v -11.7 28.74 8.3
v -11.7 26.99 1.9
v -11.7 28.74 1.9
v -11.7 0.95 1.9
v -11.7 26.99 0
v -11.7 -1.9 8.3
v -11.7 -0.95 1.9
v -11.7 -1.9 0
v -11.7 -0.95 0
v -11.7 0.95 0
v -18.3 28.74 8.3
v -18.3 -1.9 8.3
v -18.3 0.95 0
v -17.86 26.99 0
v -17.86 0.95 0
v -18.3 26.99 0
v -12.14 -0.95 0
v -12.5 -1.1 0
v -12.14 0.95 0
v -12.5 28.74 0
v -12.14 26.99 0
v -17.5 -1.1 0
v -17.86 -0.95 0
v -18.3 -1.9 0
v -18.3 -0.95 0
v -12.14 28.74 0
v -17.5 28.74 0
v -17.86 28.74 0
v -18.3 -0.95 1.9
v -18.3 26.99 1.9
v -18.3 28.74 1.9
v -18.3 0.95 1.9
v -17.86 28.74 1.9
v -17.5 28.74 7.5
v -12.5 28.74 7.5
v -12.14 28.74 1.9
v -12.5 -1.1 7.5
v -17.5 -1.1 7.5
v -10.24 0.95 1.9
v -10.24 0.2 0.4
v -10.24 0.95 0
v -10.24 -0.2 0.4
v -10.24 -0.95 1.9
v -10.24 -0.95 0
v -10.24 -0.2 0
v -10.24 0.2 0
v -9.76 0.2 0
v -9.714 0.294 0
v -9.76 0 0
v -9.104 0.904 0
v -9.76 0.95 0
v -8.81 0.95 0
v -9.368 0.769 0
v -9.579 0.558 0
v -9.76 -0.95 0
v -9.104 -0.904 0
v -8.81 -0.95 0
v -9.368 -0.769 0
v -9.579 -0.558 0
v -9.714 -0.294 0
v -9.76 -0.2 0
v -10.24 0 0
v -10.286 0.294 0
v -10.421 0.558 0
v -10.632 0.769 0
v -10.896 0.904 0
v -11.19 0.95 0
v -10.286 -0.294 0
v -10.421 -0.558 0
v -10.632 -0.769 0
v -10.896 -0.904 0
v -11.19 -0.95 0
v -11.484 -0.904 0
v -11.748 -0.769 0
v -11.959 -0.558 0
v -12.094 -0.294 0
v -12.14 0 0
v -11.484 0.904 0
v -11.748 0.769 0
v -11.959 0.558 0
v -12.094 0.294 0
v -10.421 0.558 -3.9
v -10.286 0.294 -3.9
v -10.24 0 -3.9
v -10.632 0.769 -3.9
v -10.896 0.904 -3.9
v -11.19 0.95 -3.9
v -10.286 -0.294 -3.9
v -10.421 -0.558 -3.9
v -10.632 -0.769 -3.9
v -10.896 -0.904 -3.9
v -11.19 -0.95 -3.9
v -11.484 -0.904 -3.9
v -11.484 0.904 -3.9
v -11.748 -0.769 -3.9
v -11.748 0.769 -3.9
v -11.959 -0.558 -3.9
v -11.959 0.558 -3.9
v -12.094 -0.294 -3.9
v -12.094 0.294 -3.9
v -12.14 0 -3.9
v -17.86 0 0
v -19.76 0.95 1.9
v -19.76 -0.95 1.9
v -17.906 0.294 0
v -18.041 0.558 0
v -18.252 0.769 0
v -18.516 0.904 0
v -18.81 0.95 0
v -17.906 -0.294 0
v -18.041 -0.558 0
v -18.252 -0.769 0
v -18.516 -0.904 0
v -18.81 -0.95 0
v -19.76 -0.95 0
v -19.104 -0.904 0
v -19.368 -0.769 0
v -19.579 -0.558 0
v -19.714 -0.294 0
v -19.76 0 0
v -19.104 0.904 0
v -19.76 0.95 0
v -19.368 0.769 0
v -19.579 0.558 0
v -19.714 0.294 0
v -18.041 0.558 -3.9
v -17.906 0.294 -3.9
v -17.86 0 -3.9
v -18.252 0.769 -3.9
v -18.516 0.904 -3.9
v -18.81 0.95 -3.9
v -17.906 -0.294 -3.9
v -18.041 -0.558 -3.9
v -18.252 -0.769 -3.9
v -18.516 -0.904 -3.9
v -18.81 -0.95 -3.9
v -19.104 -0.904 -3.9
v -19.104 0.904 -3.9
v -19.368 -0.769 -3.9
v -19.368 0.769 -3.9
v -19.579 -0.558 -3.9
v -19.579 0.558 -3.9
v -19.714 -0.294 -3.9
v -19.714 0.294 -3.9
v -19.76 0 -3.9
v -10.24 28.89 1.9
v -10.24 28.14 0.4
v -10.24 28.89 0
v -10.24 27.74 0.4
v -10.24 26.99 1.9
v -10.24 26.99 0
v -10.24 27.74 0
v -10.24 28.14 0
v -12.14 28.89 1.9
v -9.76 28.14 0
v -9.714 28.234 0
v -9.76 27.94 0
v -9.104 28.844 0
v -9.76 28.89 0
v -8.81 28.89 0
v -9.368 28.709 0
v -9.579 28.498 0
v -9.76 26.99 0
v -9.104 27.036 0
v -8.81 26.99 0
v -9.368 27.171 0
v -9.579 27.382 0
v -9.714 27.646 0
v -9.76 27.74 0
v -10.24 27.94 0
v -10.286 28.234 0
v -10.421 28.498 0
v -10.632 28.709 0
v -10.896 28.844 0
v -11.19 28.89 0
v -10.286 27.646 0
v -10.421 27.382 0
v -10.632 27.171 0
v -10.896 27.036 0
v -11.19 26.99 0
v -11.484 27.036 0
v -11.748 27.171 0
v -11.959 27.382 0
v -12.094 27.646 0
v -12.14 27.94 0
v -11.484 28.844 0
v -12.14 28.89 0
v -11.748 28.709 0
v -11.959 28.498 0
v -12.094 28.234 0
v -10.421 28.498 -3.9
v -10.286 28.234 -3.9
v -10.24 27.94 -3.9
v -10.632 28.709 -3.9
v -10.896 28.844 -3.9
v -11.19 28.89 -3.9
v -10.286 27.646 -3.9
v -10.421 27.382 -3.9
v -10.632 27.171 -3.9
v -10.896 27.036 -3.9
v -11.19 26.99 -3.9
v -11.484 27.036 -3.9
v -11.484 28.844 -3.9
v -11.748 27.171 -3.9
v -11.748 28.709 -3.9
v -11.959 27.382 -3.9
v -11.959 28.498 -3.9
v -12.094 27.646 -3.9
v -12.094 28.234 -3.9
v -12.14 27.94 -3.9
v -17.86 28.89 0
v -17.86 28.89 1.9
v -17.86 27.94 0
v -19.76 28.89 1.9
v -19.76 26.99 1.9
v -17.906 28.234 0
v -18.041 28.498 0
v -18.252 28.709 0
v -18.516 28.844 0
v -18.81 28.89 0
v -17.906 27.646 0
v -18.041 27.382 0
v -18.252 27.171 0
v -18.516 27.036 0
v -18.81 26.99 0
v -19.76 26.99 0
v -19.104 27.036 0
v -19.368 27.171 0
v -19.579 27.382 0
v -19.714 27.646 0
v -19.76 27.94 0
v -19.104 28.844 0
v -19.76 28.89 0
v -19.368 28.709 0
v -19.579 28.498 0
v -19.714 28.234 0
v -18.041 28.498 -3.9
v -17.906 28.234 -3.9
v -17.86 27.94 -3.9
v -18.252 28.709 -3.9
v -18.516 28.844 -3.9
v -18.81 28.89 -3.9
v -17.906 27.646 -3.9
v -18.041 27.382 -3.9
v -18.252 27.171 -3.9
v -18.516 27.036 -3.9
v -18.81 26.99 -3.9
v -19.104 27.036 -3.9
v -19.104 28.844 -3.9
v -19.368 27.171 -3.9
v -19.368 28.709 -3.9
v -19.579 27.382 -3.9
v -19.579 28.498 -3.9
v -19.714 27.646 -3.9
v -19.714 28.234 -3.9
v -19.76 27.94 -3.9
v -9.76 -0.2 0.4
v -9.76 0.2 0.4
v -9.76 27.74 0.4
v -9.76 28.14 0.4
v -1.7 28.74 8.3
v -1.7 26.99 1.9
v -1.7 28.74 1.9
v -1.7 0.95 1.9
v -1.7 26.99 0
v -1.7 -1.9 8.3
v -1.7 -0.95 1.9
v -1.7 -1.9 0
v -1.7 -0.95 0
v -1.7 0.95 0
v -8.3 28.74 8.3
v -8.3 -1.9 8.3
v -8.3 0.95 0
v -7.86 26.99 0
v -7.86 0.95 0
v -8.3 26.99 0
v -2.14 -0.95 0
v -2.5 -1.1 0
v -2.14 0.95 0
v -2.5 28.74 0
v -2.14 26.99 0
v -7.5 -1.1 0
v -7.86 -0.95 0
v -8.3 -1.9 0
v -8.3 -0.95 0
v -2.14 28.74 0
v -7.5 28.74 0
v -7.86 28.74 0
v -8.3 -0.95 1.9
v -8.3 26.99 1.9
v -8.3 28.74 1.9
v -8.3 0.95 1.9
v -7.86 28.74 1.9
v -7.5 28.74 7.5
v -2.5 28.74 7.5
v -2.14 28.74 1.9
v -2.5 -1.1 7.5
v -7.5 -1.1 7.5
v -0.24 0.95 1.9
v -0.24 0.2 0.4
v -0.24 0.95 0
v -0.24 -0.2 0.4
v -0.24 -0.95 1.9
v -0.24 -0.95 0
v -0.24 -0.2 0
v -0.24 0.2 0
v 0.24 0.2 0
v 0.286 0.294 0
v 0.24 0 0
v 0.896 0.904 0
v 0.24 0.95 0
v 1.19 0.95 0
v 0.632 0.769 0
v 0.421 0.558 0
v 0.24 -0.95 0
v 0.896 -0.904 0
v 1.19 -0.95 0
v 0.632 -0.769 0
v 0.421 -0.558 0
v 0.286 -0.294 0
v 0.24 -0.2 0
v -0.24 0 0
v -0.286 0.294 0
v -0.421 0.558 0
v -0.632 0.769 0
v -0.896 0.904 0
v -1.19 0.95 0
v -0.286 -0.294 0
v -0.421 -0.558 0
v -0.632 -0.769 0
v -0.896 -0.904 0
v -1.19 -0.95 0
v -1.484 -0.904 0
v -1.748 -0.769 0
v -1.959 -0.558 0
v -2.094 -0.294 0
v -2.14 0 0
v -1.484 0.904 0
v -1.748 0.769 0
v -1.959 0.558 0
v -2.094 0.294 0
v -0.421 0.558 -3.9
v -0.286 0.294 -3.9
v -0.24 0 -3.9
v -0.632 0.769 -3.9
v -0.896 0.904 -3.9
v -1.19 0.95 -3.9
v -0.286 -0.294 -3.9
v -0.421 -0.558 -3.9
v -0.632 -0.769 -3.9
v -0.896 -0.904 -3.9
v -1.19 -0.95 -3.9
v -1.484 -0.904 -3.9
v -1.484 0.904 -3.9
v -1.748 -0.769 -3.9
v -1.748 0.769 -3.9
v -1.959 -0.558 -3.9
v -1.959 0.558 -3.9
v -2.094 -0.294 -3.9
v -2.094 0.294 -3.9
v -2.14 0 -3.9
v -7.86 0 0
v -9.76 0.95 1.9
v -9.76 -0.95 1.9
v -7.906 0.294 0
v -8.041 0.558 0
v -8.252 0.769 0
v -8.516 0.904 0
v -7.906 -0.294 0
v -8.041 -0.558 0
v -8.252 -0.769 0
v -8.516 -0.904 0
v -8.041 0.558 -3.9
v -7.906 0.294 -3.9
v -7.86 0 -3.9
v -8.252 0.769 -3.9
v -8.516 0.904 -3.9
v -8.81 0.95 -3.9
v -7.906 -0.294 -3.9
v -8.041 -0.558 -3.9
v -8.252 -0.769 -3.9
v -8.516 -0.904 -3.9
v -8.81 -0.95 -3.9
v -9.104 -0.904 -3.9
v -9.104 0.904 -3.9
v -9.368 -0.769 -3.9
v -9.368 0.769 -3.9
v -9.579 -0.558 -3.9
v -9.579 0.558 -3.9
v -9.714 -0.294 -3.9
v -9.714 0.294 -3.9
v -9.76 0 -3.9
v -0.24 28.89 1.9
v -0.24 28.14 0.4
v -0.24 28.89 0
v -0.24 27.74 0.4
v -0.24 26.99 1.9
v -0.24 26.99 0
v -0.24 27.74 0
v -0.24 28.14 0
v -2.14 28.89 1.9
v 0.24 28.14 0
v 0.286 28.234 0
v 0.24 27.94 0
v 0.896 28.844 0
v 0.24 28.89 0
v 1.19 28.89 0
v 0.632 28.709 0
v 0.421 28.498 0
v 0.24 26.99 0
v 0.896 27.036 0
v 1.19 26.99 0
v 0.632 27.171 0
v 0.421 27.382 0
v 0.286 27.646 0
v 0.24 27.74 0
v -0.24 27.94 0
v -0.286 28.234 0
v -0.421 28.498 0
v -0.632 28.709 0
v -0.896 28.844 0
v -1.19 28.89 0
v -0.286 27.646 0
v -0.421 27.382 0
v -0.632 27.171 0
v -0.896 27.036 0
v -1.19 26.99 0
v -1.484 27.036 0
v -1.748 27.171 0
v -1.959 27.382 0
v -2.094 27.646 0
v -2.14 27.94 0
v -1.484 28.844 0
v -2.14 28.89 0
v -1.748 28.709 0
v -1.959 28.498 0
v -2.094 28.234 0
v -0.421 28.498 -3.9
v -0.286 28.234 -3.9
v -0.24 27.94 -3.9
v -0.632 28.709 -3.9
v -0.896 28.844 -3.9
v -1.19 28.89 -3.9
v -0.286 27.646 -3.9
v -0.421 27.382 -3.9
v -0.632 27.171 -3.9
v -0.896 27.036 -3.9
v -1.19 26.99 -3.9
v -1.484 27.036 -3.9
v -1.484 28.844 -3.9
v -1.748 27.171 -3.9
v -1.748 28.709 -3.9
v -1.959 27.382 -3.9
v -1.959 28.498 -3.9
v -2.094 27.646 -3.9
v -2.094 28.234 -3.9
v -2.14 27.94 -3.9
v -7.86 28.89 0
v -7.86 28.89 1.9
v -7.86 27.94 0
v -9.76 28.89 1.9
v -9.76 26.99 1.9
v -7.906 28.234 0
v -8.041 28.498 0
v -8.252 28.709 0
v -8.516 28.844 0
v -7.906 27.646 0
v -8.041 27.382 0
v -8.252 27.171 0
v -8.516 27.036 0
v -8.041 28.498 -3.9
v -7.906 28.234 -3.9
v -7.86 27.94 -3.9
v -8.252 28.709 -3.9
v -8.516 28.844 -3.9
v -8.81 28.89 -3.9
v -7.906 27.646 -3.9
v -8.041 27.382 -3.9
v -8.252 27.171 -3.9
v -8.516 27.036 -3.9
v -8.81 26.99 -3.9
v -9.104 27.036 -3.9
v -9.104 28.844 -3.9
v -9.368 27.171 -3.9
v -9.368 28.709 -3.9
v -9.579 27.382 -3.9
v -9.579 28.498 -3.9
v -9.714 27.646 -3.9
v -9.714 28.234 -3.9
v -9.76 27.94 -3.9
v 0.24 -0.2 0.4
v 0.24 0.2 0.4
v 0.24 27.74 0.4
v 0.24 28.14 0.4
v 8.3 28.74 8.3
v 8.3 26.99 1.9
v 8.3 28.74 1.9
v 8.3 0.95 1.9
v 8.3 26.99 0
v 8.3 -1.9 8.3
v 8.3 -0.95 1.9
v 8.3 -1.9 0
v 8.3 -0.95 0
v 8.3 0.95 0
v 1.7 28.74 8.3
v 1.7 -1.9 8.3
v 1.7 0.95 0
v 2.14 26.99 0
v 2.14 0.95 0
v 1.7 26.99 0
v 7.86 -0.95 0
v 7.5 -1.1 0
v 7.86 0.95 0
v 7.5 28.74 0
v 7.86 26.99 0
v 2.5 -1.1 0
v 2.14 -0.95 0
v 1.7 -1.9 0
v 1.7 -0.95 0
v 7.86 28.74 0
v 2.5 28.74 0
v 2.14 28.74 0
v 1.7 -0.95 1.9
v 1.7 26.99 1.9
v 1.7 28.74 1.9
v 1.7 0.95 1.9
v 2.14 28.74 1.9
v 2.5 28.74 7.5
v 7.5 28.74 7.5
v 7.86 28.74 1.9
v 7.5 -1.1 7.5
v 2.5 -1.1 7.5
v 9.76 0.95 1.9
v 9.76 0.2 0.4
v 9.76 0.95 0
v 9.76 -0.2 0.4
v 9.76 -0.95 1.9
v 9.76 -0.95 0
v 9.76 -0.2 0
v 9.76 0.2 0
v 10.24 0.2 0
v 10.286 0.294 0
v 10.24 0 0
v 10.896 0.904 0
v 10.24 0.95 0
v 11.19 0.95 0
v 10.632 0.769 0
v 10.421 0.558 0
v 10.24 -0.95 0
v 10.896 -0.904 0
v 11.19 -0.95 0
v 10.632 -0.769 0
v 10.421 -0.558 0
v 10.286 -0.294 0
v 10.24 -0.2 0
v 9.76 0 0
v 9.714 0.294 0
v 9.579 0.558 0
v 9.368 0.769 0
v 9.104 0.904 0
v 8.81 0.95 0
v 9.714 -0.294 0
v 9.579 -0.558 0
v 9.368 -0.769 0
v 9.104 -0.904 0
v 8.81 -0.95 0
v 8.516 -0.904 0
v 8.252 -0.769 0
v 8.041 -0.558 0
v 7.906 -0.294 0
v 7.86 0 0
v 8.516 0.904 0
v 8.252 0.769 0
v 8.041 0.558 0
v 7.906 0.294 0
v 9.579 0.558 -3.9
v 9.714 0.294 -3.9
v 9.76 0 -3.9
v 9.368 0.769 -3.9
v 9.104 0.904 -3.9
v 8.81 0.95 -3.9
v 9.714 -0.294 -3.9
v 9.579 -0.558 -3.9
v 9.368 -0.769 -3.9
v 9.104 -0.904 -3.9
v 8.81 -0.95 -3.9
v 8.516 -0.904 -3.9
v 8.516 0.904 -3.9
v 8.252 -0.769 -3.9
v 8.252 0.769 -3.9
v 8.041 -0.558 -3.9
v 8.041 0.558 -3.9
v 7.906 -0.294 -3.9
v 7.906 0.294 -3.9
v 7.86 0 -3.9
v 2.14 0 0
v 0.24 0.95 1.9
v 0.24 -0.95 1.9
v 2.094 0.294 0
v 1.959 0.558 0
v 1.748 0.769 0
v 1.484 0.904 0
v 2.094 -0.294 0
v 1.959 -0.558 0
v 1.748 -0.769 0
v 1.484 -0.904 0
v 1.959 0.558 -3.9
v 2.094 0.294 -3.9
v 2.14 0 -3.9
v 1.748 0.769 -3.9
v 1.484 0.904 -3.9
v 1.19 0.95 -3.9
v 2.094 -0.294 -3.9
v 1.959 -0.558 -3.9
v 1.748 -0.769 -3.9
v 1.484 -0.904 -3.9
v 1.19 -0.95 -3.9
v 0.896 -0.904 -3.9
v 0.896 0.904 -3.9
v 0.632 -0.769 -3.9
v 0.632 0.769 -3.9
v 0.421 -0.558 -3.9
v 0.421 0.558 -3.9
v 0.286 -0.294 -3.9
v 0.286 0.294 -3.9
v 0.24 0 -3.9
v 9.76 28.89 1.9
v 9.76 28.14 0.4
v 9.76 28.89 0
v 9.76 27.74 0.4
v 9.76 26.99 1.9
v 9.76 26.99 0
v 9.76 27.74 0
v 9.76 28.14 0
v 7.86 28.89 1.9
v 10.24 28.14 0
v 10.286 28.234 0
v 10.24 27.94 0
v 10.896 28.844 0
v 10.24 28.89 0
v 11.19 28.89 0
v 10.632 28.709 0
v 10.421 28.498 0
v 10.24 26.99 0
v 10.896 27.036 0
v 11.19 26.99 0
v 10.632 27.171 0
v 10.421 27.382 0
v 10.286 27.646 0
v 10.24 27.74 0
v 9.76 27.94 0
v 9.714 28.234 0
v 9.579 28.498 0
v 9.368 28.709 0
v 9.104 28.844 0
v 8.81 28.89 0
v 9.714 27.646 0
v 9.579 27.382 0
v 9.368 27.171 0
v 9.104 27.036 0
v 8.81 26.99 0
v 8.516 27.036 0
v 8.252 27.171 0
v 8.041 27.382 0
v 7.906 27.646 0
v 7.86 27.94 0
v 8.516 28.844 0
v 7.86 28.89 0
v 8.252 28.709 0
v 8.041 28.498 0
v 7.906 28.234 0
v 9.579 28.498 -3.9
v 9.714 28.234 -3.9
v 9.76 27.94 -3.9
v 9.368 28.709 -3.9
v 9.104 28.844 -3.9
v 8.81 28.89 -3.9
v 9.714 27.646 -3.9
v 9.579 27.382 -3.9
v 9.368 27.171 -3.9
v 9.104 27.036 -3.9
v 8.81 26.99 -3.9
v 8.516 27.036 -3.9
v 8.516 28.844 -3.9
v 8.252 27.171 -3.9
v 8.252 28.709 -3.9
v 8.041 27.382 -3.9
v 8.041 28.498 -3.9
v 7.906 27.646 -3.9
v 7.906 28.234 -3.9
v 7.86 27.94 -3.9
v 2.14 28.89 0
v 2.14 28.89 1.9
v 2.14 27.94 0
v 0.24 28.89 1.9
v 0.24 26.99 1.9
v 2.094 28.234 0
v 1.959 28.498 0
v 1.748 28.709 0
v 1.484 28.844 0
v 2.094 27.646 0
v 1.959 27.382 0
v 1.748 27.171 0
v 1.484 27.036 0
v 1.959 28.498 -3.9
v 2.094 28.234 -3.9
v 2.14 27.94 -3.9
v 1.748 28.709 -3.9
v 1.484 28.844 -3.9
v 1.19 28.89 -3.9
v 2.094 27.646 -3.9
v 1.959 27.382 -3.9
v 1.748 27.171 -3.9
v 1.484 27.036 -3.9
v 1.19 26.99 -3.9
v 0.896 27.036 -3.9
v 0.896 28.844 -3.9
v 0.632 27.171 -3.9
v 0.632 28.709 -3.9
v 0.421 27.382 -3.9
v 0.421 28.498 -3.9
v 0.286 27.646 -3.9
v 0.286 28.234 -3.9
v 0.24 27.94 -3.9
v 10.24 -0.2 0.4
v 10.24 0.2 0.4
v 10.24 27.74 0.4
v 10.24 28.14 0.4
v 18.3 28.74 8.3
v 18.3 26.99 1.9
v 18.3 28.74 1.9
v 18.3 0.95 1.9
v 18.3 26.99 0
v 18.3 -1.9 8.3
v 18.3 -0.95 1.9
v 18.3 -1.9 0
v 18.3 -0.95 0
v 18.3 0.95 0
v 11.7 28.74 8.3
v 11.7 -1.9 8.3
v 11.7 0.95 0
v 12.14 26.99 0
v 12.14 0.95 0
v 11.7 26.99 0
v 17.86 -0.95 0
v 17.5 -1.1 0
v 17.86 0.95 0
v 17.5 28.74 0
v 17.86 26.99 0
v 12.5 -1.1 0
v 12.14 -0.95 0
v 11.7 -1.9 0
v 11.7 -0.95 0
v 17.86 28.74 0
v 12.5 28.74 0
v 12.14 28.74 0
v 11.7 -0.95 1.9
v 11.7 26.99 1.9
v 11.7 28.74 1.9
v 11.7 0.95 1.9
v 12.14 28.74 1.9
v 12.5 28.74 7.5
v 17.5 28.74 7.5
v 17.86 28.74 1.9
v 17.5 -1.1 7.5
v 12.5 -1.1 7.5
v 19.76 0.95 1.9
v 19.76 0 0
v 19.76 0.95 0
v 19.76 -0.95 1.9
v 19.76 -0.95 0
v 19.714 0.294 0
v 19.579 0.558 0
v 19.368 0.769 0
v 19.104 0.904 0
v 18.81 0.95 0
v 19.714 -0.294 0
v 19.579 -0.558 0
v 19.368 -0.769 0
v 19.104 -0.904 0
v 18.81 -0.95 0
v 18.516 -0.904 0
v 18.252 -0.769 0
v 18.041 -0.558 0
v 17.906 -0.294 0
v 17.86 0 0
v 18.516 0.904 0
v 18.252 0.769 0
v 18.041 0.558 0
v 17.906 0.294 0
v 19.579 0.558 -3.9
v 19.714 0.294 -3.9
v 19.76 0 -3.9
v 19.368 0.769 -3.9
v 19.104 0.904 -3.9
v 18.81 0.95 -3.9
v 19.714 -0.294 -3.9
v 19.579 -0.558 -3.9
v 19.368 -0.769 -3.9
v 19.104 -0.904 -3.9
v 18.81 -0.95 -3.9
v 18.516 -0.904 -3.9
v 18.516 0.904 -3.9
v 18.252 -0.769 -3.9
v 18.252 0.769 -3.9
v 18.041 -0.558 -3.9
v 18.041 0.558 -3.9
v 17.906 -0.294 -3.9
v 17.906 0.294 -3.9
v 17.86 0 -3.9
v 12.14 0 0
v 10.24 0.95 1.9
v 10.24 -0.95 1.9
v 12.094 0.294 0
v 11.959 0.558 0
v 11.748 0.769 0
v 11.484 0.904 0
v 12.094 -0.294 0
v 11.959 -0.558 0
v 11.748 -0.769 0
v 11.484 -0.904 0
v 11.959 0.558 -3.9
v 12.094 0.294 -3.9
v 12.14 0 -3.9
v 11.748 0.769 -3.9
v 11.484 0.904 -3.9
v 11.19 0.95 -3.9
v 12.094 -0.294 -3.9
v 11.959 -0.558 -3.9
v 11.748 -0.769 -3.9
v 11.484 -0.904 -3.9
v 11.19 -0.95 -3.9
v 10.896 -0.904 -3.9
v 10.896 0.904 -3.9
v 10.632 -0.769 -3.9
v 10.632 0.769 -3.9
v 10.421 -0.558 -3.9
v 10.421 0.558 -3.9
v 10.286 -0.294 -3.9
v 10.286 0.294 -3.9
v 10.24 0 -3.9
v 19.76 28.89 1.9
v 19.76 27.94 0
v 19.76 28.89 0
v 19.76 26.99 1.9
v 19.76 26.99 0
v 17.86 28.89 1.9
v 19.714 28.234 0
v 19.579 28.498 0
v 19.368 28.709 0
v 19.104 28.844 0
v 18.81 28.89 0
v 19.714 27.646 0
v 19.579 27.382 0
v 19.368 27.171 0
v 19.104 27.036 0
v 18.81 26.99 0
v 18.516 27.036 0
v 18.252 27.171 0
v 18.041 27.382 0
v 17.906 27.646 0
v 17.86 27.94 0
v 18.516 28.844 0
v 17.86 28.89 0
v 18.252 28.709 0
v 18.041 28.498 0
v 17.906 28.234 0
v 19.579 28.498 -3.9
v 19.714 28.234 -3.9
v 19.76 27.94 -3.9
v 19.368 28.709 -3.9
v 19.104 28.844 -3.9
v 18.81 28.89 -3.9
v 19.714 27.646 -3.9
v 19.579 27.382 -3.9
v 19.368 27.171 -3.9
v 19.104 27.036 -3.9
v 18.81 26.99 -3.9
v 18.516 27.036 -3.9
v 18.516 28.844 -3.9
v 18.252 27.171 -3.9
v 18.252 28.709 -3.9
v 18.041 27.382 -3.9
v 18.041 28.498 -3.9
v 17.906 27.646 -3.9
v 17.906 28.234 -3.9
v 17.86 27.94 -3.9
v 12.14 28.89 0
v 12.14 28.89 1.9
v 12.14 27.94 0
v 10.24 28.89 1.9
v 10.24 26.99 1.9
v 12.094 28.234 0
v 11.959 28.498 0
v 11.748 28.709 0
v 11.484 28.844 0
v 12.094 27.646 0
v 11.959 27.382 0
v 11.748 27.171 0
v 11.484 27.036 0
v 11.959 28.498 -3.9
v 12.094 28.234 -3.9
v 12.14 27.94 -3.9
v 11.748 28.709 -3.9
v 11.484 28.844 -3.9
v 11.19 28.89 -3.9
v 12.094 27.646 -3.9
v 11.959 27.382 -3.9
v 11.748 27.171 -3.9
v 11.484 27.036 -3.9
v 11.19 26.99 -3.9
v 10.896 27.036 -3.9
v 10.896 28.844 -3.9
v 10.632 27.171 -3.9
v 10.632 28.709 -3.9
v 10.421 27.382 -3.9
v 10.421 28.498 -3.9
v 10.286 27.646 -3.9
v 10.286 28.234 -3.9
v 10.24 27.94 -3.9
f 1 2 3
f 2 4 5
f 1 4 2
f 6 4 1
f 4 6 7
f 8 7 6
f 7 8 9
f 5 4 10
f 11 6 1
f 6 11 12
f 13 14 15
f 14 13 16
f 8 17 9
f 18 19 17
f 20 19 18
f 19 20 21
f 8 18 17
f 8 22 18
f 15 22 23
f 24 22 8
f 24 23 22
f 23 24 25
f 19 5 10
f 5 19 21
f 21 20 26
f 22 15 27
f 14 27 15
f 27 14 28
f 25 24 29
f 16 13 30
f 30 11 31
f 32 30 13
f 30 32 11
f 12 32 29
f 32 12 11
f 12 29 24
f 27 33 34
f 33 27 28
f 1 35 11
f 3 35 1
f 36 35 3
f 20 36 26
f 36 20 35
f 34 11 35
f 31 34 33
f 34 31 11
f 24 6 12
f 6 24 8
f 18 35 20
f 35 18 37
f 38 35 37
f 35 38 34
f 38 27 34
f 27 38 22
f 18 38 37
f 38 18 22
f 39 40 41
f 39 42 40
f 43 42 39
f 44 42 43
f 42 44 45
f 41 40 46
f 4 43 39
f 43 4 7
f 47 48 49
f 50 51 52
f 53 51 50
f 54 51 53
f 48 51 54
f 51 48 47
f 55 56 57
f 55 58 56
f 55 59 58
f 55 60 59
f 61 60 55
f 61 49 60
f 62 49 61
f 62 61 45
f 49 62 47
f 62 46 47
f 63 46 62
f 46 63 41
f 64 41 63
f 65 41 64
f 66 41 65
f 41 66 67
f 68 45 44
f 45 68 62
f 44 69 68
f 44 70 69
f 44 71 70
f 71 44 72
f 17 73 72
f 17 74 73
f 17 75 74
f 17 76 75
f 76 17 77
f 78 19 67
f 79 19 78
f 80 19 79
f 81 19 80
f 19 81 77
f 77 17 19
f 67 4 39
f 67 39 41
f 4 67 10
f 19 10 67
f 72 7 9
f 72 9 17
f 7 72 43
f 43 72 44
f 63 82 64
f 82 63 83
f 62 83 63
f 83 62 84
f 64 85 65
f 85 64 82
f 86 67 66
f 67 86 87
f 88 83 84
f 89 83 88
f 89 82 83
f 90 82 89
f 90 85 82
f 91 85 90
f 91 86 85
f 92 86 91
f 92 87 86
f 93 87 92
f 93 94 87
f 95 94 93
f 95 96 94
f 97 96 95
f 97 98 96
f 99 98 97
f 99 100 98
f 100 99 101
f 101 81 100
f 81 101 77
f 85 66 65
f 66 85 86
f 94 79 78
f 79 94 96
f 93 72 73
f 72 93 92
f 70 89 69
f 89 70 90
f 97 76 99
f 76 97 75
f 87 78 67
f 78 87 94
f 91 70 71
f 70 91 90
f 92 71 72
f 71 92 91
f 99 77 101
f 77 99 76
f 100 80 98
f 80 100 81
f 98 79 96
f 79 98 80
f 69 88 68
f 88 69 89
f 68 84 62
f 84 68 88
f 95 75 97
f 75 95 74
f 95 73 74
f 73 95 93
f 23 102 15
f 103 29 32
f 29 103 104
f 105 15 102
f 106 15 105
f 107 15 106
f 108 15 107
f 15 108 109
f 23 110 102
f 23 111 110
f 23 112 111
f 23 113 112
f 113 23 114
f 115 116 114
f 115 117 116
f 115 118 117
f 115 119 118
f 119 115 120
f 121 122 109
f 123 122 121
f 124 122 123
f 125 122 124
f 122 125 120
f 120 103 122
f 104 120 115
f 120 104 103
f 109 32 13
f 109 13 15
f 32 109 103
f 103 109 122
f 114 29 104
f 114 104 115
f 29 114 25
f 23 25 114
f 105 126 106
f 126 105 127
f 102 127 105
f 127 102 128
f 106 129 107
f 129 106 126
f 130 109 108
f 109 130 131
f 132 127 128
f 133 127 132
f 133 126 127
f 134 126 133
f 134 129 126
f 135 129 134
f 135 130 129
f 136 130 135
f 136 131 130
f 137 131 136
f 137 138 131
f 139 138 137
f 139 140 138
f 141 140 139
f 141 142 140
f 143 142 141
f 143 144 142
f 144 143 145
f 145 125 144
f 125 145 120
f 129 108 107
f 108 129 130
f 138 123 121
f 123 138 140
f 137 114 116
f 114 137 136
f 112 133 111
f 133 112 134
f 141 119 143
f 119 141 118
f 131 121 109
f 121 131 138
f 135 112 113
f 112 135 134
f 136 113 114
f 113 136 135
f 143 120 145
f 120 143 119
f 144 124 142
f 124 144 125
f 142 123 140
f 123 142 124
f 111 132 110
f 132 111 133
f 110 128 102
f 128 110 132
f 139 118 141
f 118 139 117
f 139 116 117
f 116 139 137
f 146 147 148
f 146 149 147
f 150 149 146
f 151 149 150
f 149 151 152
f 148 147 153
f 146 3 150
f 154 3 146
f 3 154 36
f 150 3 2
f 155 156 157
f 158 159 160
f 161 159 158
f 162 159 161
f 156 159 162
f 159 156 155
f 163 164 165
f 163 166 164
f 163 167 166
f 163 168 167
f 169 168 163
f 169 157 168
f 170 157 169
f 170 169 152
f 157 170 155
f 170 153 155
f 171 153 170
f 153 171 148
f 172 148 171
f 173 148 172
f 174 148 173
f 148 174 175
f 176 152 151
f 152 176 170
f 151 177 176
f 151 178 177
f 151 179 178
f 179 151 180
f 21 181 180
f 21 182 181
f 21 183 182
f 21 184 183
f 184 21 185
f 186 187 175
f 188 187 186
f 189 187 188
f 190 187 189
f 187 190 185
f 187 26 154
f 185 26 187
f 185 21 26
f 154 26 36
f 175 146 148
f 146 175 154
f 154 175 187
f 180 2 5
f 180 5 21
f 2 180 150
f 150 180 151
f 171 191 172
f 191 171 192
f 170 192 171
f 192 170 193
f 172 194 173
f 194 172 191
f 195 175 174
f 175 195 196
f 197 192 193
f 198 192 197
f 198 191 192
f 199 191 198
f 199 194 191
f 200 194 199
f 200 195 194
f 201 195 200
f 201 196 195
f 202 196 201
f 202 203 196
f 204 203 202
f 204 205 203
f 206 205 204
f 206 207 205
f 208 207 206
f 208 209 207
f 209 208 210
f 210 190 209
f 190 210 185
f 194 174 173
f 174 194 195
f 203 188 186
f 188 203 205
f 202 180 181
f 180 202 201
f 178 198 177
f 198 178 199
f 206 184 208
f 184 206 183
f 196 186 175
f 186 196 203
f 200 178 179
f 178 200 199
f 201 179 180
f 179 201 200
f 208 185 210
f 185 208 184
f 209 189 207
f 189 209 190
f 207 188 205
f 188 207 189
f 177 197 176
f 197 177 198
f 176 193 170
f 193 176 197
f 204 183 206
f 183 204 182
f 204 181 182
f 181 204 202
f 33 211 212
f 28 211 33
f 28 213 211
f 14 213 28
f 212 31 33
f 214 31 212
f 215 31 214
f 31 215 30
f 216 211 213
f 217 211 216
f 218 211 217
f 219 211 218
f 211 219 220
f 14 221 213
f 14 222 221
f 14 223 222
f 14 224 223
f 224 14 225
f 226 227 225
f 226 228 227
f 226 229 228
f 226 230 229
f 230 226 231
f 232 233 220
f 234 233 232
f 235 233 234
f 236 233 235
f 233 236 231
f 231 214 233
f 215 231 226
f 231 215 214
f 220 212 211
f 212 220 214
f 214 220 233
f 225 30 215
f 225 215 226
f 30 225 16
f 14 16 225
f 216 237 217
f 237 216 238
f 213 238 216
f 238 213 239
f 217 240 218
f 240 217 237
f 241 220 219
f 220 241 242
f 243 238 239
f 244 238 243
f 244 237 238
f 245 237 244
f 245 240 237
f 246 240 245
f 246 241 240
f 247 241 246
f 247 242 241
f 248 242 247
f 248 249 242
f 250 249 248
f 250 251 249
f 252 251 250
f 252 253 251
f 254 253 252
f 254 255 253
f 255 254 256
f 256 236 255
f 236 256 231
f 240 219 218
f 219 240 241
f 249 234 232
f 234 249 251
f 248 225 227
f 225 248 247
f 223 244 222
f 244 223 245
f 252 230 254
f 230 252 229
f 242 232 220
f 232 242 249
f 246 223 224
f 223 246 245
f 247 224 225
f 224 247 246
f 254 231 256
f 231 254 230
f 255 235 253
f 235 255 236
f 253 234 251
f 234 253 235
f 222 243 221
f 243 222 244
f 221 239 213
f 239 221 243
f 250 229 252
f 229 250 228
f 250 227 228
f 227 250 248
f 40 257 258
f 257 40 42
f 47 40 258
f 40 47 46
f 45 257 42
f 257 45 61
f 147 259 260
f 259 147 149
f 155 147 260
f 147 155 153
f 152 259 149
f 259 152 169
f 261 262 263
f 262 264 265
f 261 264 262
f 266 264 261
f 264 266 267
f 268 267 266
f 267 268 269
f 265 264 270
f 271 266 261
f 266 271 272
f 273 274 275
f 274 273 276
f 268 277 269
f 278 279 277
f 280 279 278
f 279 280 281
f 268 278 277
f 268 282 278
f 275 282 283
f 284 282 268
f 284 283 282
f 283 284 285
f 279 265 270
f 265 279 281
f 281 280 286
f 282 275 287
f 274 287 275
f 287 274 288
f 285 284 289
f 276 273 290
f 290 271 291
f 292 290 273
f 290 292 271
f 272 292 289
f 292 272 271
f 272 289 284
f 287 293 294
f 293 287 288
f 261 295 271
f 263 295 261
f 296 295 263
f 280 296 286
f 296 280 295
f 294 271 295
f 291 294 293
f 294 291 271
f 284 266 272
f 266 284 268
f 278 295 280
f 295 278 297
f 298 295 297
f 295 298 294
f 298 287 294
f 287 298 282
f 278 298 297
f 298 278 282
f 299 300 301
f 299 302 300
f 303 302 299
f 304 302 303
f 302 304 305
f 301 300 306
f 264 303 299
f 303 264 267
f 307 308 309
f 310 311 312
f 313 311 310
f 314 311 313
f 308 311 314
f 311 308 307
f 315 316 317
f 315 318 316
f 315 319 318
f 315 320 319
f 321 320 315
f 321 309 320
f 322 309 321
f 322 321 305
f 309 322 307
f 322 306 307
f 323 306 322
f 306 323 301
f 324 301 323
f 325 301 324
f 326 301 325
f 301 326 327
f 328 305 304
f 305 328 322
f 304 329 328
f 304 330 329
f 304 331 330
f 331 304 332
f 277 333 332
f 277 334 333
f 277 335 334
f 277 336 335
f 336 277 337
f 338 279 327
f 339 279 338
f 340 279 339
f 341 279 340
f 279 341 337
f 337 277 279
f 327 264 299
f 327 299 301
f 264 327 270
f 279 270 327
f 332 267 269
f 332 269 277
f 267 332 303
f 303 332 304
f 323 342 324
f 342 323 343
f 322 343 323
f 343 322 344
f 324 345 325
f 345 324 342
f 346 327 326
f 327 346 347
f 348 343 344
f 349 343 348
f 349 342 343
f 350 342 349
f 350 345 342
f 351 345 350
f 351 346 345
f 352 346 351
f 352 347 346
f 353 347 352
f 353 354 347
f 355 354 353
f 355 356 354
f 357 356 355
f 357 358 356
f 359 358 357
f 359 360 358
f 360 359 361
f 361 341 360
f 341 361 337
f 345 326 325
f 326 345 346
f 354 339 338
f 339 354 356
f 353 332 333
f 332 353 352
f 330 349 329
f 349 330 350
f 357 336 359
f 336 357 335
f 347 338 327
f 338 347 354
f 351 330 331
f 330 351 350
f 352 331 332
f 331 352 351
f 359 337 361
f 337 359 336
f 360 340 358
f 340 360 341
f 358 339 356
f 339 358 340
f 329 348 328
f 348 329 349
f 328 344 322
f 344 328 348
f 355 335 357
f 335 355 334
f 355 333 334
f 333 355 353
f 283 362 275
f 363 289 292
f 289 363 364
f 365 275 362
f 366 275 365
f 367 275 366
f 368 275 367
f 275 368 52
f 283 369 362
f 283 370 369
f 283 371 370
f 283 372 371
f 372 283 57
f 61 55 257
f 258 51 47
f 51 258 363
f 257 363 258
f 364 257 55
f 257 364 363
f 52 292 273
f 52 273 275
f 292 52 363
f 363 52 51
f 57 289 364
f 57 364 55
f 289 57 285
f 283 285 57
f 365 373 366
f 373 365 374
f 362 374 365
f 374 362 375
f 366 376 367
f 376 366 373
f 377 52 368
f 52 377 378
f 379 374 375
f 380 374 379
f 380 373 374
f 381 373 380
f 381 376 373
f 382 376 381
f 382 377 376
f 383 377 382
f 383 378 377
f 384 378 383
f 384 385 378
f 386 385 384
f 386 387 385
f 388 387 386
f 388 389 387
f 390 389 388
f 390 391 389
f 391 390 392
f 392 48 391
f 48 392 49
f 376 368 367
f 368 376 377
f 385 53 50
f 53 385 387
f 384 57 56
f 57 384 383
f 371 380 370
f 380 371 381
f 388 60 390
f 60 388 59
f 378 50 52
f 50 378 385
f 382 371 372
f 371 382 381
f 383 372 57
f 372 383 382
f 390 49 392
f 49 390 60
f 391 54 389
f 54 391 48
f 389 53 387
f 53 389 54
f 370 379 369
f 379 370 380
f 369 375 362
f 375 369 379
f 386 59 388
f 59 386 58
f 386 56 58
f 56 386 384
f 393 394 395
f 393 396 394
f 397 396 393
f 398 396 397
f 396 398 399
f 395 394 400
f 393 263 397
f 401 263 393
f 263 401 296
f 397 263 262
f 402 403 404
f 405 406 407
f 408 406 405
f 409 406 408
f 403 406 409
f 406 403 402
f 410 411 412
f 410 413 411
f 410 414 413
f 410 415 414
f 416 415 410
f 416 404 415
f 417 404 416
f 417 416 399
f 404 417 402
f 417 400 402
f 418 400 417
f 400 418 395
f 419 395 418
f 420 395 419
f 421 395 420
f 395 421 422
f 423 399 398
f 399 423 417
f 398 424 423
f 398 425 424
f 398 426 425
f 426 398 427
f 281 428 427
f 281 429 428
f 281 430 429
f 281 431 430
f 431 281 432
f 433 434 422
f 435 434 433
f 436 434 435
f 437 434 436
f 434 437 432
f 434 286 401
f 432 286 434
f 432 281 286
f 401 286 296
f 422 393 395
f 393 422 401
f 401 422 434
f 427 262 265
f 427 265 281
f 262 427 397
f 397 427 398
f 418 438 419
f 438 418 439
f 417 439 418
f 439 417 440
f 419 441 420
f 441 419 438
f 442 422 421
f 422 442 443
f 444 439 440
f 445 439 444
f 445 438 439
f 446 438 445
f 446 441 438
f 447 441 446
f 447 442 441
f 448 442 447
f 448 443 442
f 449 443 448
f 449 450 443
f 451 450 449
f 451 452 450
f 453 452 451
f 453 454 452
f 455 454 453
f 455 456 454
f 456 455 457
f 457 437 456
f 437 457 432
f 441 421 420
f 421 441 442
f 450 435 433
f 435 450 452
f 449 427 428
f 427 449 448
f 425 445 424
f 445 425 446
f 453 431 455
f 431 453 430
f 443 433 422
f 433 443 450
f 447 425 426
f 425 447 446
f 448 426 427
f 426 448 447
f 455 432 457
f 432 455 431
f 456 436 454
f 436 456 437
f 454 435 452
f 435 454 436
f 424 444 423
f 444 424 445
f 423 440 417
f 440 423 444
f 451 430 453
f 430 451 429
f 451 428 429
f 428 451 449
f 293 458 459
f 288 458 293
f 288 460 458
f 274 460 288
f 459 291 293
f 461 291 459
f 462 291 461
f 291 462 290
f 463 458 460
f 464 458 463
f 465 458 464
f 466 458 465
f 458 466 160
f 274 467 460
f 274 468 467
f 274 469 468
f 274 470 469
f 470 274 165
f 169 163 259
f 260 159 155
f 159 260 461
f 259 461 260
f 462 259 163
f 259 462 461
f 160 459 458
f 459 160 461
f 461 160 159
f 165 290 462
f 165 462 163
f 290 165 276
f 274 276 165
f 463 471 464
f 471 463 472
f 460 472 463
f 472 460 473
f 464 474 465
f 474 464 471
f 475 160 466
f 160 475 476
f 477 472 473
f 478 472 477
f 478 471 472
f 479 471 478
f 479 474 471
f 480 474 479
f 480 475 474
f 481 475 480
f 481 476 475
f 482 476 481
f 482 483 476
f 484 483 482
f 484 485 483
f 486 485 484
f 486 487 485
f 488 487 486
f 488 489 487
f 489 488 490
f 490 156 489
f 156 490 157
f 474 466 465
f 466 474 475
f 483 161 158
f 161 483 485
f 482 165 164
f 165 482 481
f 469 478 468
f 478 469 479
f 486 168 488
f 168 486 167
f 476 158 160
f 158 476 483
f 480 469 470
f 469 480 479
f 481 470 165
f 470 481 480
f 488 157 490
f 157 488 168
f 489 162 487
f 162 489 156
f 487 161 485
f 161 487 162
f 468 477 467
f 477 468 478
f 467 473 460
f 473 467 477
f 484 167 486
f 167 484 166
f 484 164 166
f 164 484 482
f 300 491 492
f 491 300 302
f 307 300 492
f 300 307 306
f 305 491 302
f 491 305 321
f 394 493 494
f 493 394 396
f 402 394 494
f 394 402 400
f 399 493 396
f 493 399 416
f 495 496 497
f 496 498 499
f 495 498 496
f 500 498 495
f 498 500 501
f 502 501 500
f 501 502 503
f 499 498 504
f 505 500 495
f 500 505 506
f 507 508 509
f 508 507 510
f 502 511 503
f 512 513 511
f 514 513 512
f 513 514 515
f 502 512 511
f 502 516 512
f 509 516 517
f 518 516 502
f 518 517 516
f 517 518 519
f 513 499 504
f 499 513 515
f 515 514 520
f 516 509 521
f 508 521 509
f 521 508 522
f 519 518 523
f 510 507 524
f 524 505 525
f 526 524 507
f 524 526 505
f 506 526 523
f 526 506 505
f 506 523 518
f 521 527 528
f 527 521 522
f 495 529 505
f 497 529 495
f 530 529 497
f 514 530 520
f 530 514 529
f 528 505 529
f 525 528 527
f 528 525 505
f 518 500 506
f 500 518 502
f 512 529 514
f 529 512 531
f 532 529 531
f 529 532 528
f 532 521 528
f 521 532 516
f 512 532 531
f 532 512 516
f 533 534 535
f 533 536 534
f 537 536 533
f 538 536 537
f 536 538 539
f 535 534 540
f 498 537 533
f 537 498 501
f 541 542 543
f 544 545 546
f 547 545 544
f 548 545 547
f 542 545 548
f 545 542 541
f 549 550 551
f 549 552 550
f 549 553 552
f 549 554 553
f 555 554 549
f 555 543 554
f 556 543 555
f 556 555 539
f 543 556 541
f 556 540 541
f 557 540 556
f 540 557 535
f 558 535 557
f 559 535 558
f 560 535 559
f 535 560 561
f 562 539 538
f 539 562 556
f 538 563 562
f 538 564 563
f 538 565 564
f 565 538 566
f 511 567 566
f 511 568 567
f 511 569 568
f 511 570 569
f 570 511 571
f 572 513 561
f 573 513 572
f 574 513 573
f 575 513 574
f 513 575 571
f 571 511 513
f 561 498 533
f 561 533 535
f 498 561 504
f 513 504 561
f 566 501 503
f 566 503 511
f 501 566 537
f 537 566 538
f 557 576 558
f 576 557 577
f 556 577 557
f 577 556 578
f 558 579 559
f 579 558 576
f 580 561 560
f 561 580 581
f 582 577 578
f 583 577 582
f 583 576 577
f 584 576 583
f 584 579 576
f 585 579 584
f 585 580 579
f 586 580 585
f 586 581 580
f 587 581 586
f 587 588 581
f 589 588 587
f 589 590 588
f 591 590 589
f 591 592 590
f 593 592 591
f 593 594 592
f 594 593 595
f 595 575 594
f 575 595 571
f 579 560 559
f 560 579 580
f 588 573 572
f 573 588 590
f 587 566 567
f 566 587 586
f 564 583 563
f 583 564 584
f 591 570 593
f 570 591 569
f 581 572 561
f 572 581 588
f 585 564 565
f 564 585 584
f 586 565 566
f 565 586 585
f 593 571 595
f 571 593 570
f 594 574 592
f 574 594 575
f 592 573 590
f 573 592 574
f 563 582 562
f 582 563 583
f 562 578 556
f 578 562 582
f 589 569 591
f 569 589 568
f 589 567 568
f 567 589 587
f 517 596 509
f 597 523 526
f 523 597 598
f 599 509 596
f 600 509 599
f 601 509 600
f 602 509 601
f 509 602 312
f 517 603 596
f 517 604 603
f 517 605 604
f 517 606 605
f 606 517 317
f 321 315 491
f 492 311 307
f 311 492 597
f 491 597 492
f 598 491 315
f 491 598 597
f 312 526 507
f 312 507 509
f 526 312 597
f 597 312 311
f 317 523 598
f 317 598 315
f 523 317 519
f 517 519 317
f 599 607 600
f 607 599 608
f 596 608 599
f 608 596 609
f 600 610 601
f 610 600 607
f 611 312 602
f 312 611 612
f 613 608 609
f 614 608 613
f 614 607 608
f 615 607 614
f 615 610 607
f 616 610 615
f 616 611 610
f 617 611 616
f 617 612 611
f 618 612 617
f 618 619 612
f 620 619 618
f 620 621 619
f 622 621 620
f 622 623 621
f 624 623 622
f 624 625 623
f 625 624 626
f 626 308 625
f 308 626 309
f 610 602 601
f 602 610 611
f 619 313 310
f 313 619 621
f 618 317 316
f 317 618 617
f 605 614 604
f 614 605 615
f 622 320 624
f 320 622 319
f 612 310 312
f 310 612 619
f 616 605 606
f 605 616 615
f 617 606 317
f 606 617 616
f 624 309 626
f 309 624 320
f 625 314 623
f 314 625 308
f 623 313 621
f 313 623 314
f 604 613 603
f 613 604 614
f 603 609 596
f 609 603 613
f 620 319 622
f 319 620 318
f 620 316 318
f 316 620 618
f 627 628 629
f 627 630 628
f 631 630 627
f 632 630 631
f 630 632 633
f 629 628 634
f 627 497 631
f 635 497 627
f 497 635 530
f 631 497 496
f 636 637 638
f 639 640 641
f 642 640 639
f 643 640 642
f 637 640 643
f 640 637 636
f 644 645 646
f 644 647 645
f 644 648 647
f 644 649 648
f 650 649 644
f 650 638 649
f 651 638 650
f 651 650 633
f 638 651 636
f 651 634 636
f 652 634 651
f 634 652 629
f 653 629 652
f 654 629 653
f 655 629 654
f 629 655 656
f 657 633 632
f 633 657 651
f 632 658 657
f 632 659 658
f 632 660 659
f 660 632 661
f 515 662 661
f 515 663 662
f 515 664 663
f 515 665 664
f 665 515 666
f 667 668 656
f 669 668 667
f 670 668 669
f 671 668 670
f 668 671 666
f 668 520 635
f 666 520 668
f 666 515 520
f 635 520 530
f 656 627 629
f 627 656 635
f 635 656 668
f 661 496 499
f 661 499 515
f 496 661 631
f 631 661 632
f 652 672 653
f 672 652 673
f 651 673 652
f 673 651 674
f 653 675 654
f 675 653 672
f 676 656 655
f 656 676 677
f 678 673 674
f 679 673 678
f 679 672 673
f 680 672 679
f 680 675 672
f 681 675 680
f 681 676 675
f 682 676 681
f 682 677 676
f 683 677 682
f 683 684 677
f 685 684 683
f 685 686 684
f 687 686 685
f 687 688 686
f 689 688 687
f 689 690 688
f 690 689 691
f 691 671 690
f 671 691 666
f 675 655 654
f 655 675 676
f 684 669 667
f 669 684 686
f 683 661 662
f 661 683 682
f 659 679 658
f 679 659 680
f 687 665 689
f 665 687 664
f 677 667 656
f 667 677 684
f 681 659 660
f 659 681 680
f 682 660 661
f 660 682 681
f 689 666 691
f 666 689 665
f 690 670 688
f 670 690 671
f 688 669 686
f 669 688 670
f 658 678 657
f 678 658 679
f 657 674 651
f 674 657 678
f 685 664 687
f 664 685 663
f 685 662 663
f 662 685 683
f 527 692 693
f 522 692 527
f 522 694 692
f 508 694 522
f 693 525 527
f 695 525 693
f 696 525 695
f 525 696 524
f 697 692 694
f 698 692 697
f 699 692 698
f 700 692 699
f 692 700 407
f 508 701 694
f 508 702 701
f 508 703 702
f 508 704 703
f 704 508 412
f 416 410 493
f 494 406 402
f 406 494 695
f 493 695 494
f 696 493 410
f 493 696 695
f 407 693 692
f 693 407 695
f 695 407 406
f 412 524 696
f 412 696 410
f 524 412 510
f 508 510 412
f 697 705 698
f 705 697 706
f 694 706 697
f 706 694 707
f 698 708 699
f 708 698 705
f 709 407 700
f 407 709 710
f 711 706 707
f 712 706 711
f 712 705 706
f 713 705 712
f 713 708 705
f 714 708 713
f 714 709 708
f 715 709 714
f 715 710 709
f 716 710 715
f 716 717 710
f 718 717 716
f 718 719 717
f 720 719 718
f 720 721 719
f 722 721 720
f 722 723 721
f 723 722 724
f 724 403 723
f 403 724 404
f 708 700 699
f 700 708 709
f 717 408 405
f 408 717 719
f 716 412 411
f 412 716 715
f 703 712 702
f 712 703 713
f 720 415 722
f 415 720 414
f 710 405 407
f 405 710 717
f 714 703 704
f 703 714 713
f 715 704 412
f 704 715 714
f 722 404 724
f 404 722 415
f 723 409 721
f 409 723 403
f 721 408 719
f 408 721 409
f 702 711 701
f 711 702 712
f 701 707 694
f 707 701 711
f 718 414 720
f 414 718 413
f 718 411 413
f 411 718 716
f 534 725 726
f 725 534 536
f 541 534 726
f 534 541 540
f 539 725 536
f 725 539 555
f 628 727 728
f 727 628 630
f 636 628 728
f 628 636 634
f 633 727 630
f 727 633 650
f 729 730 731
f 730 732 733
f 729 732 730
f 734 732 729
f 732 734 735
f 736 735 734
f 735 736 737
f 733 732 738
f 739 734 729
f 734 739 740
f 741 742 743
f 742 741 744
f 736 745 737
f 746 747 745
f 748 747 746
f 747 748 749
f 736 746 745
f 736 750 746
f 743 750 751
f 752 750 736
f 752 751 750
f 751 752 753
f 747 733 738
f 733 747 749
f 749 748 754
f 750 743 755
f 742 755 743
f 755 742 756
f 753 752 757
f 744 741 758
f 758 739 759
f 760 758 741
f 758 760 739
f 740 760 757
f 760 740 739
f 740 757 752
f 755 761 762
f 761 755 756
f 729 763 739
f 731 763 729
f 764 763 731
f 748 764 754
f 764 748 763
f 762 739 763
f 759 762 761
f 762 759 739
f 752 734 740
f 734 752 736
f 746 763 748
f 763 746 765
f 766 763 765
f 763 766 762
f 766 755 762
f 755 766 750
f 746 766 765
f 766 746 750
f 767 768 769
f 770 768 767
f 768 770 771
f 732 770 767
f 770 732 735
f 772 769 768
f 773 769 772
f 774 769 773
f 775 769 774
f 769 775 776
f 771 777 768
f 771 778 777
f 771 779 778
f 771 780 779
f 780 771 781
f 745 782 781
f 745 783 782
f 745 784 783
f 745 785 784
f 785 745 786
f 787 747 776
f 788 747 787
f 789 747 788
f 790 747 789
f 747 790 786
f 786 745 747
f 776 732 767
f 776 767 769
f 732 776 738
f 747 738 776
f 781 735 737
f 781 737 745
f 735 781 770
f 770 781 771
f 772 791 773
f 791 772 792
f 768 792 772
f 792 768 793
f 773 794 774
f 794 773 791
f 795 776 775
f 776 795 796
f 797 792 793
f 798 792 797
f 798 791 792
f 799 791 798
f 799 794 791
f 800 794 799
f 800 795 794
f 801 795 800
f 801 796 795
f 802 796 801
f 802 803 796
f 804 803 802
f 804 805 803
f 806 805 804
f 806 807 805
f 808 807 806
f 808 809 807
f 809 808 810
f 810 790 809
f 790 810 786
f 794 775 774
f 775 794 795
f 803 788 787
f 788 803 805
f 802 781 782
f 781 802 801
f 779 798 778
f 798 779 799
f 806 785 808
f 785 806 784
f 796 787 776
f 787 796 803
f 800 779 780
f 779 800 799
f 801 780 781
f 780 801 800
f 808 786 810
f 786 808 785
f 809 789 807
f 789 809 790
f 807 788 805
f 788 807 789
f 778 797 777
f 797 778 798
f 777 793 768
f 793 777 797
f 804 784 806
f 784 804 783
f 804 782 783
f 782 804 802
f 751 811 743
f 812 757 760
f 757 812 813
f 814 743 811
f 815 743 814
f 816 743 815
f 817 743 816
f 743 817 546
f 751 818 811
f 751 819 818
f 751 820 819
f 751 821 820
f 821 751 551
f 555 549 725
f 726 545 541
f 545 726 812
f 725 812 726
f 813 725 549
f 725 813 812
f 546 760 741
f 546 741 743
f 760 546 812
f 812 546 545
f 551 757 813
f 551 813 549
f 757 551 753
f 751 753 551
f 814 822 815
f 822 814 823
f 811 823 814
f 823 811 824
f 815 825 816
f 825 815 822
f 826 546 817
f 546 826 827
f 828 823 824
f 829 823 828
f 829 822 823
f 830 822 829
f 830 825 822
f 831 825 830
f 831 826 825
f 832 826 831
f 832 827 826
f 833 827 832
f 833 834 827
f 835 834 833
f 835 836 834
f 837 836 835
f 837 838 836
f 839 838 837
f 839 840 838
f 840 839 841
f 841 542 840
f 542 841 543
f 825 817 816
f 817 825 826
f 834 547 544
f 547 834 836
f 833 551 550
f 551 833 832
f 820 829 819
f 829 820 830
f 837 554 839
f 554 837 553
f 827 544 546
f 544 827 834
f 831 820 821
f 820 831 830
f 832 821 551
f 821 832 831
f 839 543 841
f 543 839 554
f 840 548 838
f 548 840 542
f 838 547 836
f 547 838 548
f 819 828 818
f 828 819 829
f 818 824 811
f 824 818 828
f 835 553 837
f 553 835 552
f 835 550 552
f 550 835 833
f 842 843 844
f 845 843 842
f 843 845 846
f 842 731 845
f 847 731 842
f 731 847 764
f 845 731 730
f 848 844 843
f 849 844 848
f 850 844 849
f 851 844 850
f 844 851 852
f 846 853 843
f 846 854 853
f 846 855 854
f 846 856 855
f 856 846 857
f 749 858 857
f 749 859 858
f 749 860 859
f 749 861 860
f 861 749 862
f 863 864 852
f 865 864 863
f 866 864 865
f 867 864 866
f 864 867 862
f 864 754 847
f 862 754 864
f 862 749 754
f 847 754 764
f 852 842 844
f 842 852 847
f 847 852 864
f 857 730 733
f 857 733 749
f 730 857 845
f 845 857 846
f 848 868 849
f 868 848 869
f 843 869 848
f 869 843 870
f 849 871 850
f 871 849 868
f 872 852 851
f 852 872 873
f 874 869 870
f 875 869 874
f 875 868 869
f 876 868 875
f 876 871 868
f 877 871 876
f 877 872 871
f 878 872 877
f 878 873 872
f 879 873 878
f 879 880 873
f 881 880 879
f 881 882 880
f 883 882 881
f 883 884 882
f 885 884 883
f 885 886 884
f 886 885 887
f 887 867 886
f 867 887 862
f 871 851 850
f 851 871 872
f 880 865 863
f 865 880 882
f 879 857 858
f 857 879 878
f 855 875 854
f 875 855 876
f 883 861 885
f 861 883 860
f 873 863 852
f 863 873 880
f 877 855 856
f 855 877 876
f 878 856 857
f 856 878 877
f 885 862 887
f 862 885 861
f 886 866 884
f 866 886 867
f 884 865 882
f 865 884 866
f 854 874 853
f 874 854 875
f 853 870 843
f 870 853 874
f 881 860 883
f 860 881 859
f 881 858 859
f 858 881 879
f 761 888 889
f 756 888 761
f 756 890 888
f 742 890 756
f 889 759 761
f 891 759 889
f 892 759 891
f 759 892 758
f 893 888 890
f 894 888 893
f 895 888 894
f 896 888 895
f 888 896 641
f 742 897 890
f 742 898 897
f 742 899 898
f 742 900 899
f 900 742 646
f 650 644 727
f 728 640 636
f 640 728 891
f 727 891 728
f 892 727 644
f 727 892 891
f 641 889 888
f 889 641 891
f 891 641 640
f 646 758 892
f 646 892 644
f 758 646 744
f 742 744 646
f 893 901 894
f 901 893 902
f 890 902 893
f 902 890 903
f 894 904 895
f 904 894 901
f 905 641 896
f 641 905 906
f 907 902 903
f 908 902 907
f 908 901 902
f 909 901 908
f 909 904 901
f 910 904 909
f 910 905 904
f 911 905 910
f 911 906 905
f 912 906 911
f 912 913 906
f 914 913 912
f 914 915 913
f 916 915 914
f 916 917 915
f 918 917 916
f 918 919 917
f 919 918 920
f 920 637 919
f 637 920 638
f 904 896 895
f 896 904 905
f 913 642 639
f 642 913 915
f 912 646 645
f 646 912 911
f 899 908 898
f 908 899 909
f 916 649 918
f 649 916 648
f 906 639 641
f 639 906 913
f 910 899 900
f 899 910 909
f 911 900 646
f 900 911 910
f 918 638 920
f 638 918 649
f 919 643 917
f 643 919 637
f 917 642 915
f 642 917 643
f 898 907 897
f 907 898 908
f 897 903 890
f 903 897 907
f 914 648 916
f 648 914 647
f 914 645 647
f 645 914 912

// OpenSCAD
$fn=20;
mousse=2.5;
ztr=5+mousse;
xtr=5;
ytr=1.1 ;
ltr =11*2.54 ;
e=0.8;

xbase=3*2.54;
ybase = 11*2.54;
zpin=4;
dpin=1.9;

module pin()
{
    translate([0,0,-zpin/2+0.1])
            cylinder(h=zpin,d=dpin,center=true);
}
module base()
{
    union()
    {
    translate([0,0,dpin/2]) cube([dpin,dpin,dpin],center=true);
    pin();
    }
}
module tunnel()
{
    yt=ytr+ltr;
    translate([0,(yt+2*e)/2-ytr-e,(ztr+e)/2])
            difference()
            {
                cube([xtr+2*e,yt+2*e,ztr+e],center=true);
                translate([0,e,-e])
                    cube([xtr,yt+2*e,ztr+e],center=true);
            }
}
module lien()
{
    union()
    {
        translate([3*2.54/2+3/2,0,e/4]) cube([3,e/2,e/2],center=true);
        translate([3*2.54/2+3/2,ybase,e/4]) cube([3,e/2,e/2],center=true);
    }
}

module cache()
{
    union()
    {
        tunnel() ;
        translate([xbase/2,0,0]) base();
        translate([-xbase/2,0,0]) base();
        translate([xbase/2,ybase,0]) base();
        translate([-xbase/2,ybase,0]) base();
    }
}

union()
{    
    translate([-15,0,0]) 
        union()
        {
            cache();
            lien();
        }
    translate([-5,0,0]) 
        union()
        {
            cache();
            lien();
        }
    translate([5,0,0]) 
        union()
        {
            cache();
            lien();
        }
    translate([15,0,0]) 
        union()
        {
            cache();
        }
}
